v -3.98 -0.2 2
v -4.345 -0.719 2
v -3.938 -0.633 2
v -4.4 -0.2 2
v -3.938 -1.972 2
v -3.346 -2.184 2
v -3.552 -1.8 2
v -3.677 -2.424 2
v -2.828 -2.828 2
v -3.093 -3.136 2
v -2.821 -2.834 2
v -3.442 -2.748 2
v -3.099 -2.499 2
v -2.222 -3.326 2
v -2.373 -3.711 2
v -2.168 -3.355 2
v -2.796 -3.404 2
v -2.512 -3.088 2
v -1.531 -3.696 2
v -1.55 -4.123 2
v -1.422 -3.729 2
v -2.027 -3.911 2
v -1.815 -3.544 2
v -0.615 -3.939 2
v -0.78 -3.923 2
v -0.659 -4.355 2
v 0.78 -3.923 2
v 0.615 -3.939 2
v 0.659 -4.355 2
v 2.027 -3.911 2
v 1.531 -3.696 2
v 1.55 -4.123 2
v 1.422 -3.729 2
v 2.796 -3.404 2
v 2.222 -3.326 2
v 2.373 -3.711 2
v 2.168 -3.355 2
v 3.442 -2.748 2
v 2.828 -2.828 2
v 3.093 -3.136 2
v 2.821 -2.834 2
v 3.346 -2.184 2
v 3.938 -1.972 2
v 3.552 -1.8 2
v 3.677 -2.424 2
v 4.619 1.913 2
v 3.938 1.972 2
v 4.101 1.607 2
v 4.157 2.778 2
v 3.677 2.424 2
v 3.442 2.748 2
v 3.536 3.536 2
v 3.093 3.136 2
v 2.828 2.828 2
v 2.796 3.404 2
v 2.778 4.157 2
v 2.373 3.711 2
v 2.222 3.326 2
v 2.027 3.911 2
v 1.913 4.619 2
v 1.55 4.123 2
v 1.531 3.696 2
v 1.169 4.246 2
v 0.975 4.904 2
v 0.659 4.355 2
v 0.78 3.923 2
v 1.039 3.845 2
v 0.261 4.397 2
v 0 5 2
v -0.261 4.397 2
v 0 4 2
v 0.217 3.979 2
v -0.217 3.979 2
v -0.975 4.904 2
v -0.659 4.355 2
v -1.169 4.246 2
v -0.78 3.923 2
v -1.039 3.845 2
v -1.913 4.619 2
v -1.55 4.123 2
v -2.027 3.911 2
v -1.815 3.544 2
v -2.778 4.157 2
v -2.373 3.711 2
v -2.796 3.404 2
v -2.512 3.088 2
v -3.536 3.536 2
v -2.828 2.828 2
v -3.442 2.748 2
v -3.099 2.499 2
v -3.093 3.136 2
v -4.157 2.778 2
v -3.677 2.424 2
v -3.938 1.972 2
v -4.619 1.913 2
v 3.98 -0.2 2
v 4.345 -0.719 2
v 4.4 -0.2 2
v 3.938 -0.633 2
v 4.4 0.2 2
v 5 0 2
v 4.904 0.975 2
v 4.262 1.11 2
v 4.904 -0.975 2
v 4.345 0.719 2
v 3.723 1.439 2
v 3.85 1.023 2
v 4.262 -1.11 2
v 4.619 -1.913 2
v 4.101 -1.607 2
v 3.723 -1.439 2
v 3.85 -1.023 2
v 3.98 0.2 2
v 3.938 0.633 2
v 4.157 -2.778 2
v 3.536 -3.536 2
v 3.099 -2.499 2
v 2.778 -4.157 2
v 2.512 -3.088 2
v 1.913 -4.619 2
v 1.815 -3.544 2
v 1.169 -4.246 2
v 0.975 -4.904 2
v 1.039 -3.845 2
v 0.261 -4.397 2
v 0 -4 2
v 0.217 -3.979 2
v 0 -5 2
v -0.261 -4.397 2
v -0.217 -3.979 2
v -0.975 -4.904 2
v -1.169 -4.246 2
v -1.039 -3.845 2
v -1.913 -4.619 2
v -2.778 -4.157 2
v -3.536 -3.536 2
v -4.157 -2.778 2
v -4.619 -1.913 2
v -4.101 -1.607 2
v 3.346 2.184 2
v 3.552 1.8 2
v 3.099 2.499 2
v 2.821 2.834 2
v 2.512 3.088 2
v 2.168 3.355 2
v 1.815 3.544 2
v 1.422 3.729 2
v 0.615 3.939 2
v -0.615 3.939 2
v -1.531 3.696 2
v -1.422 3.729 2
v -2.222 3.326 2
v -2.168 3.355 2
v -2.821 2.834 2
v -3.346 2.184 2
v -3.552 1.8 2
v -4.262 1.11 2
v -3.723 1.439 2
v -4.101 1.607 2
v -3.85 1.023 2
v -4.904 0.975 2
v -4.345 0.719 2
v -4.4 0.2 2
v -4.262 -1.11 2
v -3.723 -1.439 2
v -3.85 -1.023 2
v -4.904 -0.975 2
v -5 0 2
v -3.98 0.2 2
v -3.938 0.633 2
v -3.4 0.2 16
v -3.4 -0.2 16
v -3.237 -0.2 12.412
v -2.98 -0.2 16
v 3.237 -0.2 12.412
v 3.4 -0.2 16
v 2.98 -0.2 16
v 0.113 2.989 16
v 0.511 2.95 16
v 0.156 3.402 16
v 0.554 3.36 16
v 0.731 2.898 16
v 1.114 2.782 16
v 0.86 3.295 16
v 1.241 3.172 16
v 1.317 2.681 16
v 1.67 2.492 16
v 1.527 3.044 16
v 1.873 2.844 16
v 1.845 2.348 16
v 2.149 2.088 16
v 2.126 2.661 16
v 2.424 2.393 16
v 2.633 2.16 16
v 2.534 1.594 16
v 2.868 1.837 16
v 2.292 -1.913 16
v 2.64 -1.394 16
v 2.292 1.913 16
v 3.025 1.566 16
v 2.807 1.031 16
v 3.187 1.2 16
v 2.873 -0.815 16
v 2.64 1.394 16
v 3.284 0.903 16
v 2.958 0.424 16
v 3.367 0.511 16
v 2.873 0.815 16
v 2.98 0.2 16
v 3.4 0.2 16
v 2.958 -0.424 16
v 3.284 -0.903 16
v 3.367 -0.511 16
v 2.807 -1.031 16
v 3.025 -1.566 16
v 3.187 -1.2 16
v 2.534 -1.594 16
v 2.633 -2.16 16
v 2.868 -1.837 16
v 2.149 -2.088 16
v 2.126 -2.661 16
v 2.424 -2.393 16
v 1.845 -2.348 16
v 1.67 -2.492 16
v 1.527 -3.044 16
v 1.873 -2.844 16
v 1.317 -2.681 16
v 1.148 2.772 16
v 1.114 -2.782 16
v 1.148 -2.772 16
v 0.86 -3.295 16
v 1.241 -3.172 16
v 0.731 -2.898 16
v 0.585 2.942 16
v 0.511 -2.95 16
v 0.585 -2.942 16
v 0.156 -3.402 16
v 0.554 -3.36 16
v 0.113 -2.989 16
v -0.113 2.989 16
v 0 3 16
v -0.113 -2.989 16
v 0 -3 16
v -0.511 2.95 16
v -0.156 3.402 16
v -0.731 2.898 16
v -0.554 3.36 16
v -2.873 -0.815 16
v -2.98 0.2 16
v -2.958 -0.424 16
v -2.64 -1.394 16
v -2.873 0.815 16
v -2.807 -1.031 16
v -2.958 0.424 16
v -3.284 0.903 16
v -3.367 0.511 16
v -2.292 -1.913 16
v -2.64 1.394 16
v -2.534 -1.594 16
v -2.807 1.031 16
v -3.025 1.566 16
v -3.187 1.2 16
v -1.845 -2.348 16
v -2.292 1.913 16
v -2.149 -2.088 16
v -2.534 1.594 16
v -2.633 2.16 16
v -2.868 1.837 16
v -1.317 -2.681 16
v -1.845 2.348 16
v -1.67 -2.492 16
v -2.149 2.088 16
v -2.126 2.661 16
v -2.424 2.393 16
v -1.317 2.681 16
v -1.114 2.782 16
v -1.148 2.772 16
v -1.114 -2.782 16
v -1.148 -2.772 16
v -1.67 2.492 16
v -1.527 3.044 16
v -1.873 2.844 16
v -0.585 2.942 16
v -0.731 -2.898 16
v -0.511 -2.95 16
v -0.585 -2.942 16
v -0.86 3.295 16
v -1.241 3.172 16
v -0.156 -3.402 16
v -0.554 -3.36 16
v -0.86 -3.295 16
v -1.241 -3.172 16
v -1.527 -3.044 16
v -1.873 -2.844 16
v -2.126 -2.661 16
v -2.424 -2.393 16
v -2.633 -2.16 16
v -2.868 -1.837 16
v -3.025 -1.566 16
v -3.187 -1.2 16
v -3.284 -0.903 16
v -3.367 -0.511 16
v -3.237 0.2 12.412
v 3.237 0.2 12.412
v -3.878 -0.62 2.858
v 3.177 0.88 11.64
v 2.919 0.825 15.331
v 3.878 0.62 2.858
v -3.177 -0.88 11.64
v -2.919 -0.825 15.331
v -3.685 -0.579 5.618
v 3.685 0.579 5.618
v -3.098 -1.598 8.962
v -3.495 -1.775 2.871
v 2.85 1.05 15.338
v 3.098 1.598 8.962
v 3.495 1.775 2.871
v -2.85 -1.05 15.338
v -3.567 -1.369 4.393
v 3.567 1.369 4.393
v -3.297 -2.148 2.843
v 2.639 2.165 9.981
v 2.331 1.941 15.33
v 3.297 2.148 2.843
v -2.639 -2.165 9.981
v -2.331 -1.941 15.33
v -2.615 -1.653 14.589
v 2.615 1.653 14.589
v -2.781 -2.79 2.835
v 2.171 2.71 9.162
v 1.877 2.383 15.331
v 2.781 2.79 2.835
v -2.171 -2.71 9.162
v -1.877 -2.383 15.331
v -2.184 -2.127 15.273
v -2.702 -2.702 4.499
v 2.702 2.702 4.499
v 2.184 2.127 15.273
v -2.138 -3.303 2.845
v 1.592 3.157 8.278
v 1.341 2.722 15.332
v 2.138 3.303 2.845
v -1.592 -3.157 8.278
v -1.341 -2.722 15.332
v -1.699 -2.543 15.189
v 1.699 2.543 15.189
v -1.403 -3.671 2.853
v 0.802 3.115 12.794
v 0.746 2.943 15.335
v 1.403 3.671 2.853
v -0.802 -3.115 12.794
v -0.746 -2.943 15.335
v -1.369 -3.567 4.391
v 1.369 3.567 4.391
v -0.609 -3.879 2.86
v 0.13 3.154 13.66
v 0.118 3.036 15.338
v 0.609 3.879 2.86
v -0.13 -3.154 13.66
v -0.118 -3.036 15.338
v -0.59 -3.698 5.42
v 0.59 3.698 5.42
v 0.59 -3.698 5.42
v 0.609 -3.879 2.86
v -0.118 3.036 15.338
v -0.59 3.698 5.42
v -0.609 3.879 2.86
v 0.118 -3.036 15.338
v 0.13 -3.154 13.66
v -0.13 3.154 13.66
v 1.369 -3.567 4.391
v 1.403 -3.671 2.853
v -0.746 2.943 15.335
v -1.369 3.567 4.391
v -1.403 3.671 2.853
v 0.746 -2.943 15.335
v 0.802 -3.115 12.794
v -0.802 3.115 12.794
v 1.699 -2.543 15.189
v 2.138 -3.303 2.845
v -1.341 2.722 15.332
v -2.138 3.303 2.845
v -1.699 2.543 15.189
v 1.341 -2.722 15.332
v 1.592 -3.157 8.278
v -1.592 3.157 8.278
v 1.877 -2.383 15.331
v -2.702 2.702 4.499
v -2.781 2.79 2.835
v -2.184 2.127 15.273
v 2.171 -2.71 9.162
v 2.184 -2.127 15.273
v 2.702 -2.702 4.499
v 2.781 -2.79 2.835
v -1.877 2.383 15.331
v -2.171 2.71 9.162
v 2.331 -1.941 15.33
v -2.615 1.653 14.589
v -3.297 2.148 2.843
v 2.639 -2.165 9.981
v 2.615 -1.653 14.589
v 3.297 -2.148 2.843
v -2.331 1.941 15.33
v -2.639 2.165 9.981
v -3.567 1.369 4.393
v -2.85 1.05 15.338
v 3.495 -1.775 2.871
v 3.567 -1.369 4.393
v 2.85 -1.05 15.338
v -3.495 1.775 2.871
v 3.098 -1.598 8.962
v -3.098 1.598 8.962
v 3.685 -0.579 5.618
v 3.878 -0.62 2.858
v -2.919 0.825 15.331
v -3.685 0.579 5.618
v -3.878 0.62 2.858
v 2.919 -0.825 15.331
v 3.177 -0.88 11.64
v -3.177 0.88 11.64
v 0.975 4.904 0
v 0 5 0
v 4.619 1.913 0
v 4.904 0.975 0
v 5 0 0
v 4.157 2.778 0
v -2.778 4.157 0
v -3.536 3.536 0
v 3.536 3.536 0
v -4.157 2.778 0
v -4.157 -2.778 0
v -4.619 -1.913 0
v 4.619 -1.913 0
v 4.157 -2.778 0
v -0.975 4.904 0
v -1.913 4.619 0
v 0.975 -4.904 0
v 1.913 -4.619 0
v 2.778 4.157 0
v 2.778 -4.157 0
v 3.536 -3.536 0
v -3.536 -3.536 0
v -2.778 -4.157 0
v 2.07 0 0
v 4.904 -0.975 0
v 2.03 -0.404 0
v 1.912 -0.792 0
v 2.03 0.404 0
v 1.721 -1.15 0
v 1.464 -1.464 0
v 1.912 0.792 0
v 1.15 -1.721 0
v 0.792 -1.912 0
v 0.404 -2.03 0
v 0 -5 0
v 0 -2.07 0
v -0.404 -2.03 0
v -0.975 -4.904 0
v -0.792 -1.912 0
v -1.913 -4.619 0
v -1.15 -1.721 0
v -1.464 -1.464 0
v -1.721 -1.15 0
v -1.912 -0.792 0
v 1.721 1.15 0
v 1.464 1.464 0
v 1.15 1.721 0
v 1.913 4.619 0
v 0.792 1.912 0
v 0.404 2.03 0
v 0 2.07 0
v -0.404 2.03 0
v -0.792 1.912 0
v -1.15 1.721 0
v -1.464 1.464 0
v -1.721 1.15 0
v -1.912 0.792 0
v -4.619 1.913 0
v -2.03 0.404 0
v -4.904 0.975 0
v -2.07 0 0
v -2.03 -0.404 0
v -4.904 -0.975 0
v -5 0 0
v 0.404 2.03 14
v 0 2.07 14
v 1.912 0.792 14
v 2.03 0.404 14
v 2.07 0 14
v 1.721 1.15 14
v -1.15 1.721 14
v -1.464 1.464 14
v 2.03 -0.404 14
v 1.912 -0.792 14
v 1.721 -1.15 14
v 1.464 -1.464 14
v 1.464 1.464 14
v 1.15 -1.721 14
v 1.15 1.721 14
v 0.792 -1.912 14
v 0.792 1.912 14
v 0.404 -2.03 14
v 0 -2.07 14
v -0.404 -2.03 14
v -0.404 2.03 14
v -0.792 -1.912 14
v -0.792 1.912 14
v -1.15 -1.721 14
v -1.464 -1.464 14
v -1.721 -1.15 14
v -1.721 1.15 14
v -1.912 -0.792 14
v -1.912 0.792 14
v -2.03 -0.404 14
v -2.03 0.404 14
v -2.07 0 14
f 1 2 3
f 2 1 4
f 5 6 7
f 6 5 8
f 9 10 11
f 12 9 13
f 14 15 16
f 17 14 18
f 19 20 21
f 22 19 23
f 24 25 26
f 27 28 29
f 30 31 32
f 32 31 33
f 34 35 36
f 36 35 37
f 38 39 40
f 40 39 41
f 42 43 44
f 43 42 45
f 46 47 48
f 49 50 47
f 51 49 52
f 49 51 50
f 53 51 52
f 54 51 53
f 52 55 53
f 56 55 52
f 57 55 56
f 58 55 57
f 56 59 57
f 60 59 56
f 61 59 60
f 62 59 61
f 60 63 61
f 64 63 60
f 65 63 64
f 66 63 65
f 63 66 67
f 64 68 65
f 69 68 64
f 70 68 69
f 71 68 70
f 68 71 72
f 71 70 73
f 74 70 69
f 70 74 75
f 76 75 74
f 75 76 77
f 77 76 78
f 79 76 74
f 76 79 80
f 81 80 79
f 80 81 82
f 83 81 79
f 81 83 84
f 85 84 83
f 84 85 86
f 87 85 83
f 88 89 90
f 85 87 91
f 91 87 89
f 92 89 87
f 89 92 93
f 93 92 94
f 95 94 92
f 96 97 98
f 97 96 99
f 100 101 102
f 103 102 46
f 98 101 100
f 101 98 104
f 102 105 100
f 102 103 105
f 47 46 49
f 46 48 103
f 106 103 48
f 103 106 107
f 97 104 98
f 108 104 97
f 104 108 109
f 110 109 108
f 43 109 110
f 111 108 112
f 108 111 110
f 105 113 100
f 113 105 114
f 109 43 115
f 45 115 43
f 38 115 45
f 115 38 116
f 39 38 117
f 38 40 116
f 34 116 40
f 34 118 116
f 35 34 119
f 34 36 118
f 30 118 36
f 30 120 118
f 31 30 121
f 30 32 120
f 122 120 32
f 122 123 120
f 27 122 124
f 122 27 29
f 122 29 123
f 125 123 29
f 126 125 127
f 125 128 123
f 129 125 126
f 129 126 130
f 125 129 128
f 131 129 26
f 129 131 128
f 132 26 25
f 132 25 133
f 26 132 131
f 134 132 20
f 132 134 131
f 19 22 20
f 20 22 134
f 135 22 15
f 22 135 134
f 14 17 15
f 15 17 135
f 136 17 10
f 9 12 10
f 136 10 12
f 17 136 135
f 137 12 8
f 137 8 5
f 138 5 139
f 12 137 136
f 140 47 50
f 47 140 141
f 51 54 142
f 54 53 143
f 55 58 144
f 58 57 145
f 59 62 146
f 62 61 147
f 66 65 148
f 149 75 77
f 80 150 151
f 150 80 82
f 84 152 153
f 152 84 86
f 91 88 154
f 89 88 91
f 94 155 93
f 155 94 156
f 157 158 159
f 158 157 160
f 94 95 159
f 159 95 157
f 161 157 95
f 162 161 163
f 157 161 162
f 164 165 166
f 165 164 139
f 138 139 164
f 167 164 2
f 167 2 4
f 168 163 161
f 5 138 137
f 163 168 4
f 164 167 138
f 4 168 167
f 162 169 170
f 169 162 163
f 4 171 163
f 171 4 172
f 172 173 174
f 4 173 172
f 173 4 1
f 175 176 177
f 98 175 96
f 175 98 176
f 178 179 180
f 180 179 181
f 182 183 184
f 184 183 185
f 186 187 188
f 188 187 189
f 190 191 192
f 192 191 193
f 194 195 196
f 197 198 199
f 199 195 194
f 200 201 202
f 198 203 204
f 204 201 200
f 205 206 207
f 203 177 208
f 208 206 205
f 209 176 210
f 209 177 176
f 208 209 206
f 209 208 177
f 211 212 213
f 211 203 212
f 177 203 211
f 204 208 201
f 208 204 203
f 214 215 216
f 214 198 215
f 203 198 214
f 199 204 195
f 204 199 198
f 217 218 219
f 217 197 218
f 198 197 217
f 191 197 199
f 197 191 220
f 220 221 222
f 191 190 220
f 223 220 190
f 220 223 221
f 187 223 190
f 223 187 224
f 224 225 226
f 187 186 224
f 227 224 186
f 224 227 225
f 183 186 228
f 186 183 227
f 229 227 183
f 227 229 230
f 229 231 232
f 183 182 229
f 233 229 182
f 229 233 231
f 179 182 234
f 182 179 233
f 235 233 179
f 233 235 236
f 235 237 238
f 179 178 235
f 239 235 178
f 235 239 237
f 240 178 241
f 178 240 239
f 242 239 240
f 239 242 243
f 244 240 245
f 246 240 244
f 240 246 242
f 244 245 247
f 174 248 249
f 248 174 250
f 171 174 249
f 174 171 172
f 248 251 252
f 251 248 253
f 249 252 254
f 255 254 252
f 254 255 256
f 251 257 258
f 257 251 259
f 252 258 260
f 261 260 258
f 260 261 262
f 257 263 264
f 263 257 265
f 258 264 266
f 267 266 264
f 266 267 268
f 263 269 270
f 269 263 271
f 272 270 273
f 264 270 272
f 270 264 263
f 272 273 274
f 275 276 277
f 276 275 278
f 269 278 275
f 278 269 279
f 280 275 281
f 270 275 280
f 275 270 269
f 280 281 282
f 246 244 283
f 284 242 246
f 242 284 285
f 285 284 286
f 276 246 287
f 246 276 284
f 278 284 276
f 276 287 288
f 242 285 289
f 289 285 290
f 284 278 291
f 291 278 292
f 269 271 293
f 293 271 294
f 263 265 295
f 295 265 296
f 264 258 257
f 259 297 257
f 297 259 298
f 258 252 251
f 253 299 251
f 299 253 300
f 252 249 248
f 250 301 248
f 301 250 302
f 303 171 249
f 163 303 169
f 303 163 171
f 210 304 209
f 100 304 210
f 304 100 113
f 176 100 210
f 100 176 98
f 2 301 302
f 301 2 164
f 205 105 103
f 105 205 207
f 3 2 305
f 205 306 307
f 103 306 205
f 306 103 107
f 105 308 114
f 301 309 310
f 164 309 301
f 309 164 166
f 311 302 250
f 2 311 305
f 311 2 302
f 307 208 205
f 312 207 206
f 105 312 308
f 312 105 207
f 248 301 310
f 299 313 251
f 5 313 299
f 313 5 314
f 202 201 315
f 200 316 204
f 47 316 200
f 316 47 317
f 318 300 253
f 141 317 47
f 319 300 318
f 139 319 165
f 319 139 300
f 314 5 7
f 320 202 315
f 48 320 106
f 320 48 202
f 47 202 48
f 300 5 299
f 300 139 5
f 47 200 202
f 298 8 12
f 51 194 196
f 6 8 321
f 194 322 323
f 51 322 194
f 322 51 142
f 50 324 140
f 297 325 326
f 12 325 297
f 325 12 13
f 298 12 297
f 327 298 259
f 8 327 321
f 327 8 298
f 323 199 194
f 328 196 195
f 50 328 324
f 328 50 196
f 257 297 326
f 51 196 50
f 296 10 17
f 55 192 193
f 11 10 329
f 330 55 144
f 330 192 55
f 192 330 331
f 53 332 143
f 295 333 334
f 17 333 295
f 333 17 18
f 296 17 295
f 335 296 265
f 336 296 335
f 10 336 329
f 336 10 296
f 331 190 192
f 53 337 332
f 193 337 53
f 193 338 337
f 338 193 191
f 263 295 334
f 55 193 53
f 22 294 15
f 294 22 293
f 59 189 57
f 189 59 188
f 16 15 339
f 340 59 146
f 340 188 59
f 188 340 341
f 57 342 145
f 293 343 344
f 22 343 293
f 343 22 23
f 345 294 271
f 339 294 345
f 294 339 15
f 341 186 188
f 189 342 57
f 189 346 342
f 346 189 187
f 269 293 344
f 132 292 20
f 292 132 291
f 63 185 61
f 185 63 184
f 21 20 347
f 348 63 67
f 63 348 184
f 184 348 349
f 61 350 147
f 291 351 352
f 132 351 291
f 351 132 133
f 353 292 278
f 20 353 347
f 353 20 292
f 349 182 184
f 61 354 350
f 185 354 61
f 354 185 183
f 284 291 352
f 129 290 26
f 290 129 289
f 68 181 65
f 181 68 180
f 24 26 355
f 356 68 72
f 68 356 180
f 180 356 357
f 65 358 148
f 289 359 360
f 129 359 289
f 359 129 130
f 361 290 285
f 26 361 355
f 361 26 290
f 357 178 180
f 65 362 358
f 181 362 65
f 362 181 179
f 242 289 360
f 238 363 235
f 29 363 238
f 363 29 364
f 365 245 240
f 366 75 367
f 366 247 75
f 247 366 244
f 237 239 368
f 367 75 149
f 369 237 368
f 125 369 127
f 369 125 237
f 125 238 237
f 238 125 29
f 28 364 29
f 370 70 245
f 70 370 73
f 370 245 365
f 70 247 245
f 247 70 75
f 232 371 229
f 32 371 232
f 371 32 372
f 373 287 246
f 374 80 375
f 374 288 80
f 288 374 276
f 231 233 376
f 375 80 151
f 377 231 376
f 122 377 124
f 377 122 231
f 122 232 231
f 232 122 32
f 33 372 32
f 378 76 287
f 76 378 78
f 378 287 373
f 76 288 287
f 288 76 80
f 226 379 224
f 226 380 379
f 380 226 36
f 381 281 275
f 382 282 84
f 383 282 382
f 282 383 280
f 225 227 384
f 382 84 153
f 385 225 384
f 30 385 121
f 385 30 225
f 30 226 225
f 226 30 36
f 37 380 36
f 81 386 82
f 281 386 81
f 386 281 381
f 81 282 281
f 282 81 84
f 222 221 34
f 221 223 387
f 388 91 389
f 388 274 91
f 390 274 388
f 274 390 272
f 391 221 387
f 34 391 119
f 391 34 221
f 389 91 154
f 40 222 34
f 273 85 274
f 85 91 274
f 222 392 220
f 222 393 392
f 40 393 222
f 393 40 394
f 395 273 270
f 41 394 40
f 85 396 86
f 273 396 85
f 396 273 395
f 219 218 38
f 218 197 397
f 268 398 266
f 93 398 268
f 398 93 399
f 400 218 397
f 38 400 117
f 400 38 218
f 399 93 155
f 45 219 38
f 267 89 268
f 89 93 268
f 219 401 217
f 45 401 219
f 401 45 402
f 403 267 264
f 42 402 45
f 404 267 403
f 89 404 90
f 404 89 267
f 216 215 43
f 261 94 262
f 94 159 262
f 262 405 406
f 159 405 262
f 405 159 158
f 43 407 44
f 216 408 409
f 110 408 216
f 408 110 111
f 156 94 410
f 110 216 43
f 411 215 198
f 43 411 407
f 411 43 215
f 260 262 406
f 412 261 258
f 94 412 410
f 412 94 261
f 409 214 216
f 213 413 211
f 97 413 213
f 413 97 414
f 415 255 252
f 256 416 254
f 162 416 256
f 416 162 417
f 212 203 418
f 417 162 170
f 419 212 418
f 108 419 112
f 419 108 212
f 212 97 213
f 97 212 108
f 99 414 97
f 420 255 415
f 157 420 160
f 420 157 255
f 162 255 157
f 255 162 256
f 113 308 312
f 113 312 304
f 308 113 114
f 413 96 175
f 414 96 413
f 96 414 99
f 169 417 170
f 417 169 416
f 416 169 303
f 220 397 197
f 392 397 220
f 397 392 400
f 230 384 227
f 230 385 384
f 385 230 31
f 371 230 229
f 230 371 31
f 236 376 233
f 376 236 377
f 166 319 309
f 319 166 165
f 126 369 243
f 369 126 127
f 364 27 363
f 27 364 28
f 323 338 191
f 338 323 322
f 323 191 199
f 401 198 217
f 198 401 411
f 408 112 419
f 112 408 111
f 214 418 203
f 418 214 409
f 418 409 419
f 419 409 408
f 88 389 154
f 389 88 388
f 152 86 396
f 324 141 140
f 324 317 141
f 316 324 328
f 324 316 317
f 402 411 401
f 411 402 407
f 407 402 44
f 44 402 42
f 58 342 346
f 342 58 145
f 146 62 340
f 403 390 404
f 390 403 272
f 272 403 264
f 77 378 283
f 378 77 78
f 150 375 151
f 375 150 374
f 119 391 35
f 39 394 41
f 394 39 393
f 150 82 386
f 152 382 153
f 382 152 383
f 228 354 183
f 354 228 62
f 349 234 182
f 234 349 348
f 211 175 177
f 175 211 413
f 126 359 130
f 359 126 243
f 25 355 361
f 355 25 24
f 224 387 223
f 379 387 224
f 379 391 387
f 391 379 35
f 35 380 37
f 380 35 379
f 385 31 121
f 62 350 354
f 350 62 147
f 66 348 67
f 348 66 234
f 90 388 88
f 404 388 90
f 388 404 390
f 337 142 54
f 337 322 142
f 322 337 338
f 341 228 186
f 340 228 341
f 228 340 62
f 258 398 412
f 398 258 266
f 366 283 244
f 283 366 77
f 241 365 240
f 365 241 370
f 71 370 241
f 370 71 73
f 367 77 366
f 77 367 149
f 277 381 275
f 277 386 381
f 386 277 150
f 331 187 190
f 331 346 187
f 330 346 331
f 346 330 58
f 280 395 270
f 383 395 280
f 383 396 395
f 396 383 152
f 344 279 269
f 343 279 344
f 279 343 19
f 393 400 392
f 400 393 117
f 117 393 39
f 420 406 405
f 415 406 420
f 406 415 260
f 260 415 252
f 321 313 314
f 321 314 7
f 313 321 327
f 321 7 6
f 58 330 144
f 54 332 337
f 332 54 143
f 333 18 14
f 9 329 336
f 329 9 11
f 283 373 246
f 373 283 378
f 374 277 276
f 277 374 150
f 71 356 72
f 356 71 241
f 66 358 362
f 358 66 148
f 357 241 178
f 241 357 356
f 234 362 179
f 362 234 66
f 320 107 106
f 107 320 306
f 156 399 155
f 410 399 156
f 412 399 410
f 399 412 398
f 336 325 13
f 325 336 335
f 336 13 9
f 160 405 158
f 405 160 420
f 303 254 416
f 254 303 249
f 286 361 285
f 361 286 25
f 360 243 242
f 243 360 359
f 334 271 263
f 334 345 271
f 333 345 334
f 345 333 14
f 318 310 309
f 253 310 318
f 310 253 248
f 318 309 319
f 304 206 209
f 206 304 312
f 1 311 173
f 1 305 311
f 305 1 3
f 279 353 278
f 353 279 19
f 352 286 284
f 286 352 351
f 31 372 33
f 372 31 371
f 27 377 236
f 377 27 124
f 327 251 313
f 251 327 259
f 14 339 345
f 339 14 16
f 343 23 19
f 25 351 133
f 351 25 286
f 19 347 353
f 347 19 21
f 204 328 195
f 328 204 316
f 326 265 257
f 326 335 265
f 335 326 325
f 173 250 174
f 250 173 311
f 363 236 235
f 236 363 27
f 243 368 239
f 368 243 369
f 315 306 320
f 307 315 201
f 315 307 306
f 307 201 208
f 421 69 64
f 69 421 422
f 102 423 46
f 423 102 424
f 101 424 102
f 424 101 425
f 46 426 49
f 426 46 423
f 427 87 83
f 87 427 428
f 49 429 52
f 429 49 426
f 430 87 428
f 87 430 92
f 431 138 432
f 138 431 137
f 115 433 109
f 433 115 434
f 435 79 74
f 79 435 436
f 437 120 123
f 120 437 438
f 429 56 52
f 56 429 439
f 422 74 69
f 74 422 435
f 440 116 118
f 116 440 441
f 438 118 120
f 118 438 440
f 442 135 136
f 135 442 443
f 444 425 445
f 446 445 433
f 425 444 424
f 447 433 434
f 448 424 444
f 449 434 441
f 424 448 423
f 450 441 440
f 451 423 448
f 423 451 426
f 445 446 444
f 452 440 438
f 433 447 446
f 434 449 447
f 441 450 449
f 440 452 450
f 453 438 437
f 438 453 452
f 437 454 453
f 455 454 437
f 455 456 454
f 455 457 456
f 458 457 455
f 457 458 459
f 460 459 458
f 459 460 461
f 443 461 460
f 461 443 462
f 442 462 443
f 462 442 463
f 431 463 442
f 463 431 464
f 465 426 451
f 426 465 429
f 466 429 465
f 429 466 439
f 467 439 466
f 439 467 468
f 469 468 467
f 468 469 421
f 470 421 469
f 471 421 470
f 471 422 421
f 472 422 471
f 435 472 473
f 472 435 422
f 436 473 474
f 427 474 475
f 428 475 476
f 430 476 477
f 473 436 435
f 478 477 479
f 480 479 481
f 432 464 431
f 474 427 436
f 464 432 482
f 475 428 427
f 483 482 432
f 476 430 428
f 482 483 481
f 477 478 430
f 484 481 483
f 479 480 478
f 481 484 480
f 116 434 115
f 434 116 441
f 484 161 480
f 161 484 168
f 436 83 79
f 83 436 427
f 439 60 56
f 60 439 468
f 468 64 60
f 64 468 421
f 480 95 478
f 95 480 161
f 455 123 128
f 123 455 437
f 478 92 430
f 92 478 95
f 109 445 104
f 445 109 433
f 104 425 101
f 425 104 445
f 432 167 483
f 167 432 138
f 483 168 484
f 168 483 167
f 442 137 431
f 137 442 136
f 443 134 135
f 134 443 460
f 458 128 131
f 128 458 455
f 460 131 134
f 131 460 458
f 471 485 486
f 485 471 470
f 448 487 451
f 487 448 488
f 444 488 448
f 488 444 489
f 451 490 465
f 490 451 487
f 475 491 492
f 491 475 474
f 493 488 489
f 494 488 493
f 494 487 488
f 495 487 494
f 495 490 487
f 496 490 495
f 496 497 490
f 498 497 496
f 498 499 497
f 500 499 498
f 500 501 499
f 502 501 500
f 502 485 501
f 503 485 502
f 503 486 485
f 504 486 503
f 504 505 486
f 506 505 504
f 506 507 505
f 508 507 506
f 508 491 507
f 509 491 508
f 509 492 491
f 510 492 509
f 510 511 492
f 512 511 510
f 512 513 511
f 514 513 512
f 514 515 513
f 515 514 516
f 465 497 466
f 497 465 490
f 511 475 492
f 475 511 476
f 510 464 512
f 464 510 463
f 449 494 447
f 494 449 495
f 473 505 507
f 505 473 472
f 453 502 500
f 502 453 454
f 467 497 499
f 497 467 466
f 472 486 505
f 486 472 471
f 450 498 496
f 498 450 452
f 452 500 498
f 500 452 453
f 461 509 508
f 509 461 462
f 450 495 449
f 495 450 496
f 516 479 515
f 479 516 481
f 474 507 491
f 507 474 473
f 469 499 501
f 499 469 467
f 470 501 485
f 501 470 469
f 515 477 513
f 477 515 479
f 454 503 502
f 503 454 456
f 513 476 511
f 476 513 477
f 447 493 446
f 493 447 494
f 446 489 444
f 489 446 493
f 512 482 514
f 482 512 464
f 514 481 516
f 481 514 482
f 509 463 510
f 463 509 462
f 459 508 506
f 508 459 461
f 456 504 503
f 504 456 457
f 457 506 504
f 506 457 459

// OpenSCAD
$fn = 32;
clearance = 0.07;

hole_d = 4 + clearance * 2;

h = 14;
d1 = 8;
d2 = 6;

antislip_w = 0.4;

y = antislip_w;
x = sqrt(pow(d1 / 2, 2) - pow(y, 2));
ctp = cartesian_to_polar(x, y);
angle = ctp[1];
steps = floor(180 / angle) - 1;
step_angle = 180 / steps;

difference() {
  union() {
    cylinder(h = 2, d = 10);
    translate([0, 0, 2])
      antislip_cylinder(d1 = d1, d2 = d2, h = h);
  }
  translate([0, 0, -1]) {
    cylinder(d = hole_d, h = h + 1);
  }
}

module antislip_cylinder(d1, d2, h) {
  cylinder(d1 = d1, d2 = d2, h = h);
  for (i = [0 : 2 : steps - 1]) {
    rotate([0, 0, i * step_angle])
      translate([- (d1 / 2) - antislip_w , -antislip_w / 2, 0])
        cylinder_part(d1 + antislip_w * 2, d2 + antislip_w * 2, h, antislip_w);
  }
}

module cylinder_part(w1, w2, h, d) {
  w2_offset = (w1 - w2) / 2;
  
  polyhedron(
    points = [
      [0, 0, 0],
      [w1, 0, 0],
      [w1, d, 0],
      [0, d, 0],
      [w2_offset, 0, h],
      [w2 + w2_offset, 0, h],
      [w2 + w2_offset, d, h],
      [w2_offset, d, h],
    ],
    faces = [
      [0, 1, 2, 3],
      [7, 6, 5, 4],
      [4, 5, 1, 0],
      [5, 6, 2, 1],
      [6, 7, 3, 2],
      [0, 3, 7, 4]
    ]
  );
}

function polar_to_cartesian(length, angle) = [length * cos(angle), length * sin(angle)];

function cartesian_to_polar(x, y) = [sqrt(pow(x, 2) + pow(y, 2)), atan(y / x)];
